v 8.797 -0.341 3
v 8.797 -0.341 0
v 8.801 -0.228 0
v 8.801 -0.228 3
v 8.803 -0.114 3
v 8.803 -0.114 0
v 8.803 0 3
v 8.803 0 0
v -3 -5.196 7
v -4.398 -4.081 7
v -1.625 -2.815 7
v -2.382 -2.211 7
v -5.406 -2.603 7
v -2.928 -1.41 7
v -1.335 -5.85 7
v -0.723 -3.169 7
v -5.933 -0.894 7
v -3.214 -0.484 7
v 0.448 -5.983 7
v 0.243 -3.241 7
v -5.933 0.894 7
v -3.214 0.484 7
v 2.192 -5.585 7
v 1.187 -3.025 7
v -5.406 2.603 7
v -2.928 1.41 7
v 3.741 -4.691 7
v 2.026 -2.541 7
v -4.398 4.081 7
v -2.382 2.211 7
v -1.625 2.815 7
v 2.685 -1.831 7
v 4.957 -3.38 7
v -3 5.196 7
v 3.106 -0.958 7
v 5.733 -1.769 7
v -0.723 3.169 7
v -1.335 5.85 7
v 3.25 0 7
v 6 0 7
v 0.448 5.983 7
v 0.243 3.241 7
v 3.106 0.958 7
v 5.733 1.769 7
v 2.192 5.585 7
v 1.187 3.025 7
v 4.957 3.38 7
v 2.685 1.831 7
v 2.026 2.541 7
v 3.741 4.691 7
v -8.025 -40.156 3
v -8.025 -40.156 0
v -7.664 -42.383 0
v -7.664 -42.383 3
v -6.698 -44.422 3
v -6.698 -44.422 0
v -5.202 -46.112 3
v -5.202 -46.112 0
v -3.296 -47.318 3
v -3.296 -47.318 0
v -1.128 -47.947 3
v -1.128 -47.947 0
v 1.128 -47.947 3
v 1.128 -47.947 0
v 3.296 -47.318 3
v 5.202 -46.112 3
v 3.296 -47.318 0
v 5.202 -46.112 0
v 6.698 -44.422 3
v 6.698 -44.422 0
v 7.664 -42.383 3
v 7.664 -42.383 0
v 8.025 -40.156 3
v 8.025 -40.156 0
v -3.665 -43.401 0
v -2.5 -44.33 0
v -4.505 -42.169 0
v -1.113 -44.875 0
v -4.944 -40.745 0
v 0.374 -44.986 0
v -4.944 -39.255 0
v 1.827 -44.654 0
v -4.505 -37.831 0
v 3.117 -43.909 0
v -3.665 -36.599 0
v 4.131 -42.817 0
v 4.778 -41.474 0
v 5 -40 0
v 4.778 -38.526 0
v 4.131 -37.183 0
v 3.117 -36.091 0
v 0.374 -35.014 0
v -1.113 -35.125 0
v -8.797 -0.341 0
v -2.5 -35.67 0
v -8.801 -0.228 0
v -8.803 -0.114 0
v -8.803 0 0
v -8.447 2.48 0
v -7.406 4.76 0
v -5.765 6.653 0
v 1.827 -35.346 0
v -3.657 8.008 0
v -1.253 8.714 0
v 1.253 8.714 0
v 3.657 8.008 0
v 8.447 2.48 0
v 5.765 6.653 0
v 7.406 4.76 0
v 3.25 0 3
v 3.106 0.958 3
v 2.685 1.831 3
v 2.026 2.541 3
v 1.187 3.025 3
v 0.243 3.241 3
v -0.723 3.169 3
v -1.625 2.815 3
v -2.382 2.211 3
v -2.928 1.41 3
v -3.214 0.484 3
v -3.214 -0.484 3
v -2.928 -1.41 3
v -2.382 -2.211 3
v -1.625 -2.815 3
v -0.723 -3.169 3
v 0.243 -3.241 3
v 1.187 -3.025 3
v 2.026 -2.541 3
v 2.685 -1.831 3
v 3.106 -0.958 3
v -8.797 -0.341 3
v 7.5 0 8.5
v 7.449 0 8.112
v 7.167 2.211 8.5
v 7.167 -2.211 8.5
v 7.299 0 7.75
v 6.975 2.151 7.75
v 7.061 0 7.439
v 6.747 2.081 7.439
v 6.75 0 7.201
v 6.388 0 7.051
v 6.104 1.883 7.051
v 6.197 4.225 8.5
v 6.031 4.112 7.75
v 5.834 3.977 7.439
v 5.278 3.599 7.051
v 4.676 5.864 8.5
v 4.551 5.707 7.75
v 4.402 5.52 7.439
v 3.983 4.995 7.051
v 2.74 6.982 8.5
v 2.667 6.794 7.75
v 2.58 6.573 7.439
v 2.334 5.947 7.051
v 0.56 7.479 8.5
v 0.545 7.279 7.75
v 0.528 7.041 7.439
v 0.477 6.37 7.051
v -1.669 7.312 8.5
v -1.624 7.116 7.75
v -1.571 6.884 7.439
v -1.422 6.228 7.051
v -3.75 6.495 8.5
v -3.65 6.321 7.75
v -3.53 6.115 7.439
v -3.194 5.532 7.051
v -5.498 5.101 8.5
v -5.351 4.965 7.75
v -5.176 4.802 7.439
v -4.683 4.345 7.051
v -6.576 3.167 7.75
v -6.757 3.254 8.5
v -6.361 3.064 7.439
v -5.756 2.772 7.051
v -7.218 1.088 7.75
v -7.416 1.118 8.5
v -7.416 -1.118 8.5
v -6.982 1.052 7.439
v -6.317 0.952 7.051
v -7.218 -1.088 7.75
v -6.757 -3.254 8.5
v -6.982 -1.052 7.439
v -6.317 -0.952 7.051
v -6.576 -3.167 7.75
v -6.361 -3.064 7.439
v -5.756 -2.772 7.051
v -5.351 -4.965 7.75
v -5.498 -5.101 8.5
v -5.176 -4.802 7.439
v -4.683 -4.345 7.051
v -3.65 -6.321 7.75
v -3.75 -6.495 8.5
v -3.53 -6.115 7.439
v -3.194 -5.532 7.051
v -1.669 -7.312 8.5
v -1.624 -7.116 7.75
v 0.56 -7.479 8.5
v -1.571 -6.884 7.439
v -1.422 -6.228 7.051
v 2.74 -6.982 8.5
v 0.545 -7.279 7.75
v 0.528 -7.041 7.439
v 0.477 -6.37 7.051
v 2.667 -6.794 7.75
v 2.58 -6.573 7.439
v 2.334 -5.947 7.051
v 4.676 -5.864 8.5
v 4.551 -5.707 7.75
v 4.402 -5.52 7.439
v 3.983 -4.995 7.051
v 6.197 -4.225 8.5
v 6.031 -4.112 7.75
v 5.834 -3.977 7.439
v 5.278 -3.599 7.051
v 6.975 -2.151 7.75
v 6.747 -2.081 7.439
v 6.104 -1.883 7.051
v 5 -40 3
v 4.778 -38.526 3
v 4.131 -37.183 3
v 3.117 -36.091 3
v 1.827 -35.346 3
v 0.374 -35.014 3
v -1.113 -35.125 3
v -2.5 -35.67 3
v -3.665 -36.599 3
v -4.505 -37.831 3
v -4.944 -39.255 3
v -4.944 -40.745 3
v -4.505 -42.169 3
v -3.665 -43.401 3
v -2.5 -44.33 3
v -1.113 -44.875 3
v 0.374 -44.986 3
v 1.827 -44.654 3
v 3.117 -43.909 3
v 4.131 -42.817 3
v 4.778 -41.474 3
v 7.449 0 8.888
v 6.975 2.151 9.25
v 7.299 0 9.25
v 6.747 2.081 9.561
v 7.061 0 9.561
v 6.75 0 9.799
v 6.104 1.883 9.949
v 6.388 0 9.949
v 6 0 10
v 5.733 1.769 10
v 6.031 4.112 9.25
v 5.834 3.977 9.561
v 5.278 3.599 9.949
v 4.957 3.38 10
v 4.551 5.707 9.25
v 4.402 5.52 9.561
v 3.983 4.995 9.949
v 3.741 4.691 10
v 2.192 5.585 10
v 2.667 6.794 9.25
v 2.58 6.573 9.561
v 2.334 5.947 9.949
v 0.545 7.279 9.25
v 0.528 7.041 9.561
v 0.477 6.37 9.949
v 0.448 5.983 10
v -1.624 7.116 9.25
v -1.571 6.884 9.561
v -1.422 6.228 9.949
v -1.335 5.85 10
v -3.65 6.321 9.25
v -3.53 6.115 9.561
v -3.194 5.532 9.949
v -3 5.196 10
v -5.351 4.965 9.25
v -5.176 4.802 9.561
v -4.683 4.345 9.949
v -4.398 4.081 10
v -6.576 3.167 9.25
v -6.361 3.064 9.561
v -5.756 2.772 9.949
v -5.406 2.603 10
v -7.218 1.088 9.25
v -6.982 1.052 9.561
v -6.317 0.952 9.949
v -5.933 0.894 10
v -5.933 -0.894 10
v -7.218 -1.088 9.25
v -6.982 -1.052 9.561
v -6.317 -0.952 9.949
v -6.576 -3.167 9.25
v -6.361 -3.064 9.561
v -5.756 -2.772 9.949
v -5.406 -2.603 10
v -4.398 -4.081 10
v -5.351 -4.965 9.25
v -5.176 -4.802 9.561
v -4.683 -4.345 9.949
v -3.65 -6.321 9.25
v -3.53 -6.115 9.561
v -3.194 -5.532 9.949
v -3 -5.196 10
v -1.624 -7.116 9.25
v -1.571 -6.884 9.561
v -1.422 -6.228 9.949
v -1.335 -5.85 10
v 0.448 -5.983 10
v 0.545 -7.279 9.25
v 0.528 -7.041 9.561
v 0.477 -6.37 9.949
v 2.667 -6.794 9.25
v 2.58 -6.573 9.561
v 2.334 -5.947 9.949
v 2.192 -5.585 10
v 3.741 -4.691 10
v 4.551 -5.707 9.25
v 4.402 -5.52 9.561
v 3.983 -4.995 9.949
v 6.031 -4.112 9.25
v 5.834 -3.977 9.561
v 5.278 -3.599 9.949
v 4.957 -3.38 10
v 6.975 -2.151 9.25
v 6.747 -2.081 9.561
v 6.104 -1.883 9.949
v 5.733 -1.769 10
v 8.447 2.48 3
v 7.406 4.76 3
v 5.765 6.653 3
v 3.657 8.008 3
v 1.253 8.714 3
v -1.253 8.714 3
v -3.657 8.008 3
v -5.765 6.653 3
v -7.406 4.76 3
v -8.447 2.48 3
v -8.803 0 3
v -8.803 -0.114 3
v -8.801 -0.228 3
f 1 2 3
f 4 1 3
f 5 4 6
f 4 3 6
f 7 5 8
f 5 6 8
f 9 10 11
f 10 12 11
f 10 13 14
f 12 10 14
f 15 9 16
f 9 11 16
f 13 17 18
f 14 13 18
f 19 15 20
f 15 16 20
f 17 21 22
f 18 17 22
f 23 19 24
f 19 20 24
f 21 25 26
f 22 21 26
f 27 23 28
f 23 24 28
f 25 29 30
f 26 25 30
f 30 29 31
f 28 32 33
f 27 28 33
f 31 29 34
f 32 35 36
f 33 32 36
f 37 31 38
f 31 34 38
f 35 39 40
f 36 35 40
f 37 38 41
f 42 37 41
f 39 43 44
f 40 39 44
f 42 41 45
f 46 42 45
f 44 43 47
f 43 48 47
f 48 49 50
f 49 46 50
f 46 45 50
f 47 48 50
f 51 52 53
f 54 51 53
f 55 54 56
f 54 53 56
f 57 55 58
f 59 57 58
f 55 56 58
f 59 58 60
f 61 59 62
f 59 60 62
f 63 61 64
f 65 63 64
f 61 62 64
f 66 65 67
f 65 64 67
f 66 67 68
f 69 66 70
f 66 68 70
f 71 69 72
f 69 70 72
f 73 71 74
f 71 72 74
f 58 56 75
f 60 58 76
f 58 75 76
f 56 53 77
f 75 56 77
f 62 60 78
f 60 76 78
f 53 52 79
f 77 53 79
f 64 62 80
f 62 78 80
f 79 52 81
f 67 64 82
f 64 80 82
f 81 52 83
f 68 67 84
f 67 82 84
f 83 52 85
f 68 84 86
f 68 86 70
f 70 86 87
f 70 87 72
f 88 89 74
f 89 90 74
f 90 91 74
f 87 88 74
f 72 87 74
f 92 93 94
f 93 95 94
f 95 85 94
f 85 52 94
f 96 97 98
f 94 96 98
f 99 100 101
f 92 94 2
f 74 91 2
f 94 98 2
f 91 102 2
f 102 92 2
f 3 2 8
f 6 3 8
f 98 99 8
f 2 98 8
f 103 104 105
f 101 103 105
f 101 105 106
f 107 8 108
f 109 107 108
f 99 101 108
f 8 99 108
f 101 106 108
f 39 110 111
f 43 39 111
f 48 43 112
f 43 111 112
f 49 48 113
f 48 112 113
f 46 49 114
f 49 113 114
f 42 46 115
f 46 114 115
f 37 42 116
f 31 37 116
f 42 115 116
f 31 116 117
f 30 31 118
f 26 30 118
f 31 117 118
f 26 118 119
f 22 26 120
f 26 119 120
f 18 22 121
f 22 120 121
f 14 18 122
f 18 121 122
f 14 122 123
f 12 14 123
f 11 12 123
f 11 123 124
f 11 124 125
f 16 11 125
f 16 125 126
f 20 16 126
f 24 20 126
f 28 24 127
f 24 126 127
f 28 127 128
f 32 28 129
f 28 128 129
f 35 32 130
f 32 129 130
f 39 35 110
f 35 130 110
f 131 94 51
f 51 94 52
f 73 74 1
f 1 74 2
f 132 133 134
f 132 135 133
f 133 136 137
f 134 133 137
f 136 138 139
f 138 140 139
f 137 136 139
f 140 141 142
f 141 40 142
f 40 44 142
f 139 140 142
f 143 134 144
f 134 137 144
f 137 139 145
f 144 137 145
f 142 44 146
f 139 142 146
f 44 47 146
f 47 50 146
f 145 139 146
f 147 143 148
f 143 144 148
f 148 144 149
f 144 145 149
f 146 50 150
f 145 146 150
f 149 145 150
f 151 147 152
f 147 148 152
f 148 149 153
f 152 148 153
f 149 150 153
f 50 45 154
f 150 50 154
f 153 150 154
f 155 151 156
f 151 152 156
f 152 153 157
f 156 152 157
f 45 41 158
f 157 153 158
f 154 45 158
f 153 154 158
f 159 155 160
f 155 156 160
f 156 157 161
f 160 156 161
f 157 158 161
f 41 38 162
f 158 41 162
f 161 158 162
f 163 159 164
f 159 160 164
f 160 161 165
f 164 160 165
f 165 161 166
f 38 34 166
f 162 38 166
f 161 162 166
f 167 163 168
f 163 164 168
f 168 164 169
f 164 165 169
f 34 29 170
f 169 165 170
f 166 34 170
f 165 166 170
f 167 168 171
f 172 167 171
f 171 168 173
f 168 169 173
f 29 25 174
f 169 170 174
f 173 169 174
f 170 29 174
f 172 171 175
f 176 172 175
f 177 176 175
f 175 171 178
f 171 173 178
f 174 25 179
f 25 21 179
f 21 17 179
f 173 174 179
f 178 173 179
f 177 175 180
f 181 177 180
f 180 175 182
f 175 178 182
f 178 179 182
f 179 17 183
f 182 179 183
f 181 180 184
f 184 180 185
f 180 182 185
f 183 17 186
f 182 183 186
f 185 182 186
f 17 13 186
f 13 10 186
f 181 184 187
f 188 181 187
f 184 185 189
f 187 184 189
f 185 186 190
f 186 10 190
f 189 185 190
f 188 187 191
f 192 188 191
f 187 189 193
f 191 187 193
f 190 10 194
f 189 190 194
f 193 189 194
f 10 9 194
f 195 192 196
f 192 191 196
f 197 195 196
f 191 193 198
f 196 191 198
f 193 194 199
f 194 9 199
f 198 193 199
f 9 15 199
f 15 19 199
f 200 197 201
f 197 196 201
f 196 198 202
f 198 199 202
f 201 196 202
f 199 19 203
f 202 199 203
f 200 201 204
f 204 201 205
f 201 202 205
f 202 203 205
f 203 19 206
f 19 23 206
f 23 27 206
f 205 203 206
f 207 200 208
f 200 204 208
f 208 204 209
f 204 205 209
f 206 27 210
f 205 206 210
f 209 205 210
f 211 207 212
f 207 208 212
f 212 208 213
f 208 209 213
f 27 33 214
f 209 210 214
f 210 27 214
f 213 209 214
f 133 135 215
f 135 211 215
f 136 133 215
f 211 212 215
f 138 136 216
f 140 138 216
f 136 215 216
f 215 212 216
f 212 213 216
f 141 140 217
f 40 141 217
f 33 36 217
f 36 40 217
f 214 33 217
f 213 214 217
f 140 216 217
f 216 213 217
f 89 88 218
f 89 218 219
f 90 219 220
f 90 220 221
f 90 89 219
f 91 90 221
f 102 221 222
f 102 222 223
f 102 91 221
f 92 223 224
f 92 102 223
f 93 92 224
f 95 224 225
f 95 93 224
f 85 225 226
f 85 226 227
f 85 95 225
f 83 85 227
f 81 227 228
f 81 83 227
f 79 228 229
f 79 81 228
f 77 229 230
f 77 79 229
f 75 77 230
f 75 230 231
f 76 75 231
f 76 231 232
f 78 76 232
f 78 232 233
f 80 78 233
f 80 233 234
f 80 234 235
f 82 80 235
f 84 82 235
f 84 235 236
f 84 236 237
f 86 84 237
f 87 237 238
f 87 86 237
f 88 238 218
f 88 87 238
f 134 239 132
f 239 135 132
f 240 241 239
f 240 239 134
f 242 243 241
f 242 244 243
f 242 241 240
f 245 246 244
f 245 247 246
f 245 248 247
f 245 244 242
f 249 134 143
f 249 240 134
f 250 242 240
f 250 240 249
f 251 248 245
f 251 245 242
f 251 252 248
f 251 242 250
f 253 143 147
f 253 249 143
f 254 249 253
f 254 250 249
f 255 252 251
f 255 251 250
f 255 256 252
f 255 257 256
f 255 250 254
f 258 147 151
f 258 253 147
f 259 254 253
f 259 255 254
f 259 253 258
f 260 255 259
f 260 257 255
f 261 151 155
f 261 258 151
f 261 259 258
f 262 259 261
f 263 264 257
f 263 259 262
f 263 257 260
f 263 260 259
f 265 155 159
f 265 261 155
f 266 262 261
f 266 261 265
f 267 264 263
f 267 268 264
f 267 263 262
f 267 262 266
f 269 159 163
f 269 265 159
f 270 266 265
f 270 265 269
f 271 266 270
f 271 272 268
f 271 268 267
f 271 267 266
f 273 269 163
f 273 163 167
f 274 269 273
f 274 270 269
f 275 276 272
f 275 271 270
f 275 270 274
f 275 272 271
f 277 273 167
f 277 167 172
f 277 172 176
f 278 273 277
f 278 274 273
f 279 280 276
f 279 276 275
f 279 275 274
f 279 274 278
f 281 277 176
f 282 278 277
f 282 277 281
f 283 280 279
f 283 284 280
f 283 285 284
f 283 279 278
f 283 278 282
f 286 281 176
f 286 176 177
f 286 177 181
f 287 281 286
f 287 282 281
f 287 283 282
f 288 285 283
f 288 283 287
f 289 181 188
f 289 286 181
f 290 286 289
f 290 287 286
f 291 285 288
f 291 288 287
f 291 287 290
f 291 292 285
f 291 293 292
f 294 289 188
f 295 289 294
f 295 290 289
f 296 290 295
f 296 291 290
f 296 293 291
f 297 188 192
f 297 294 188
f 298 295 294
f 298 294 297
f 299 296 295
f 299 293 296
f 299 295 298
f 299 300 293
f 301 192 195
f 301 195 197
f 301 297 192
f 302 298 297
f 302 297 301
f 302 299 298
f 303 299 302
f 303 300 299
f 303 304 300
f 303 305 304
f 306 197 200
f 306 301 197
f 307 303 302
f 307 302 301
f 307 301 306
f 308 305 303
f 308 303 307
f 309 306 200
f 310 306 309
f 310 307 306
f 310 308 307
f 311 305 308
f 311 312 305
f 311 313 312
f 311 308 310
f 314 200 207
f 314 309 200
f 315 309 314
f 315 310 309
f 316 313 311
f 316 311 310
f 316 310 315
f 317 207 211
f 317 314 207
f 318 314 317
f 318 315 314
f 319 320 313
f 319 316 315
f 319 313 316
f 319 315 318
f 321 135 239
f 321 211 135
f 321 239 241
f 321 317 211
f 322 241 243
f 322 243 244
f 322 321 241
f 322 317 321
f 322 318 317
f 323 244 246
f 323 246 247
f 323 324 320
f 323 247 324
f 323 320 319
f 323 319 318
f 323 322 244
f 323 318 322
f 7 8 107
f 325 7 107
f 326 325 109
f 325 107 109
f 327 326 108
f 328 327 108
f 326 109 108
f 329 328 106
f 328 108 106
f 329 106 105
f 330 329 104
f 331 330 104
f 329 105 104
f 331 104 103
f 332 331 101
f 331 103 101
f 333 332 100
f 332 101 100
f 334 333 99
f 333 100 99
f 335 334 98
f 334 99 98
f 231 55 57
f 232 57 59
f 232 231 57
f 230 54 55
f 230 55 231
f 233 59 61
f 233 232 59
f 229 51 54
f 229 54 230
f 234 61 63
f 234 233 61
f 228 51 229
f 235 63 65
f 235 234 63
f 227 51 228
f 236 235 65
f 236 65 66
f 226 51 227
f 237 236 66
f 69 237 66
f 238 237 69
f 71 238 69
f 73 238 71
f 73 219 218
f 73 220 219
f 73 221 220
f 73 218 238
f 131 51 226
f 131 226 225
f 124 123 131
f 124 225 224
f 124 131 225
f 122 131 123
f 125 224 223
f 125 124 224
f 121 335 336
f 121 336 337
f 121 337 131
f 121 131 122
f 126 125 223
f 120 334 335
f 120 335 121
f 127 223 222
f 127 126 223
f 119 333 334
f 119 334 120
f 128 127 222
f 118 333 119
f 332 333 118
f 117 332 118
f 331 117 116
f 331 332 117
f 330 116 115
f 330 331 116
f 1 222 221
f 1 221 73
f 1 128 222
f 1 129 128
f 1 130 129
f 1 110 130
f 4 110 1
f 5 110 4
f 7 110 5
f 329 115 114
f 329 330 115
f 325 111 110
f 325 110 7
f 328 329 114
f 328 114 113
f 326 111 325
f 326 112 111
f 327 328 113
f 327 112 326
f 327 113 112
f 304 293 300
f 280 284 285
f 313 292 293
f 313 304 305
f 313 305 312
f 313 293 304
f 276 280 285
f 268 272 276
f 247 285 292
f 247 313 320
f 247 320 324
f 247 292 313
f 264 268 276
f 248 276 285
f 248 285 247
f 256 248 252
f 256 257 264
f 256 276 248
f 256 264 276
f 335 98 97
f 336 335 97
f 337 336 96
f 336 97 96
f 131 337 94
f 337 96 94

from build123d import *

# Parameters (mm, degrees)
F0_R     = 5
F1_DEPTH = 3
F2_R     = 3.25
F3_DEPTH = 4
F4_R     = 7.5
F5_DEPTH = 3
F6_R     = 1.49999


# Not quite as in the source:
# - a fillet or chamfer is up to 0.001 mm smaller than in the source, because OpenCascade refuses the exact size


with BuildPart() as f1:
    # F0 (on Top) → F1 (new body)
    with BuildSketch(Plane.XY):
        with BuildLine():
            Line((8.8034559258, 0), (8.7968361379, -0.3413359058))
            ThreePointArc((8.7968361379, -0.3413359058), (8.8018008233, -0.1707000455), (8.8034559258, 0))
        make_face()
        with BuildLine():
            Line((8.024687147, -40.1556288865), (8.7968361379, -0.3413359058))
            Line((8.7968361379, -0.3413359058), (8.8034559258, 0))
            ThreePointArc((8.8034559258, 0), (0, 8.8034559258), (-8.8034559258, 0))
            Line((-8.8034559258, 0), (-8.7968361379, -0.3413359058))
            Line((-8.7968361379, -0.3413359058), (-8.024687147, -40.1556288865))
            ThreePointArc((-8.024687147, -40.1556288865), (0, -48.02619612), (8.024687147, -40.1556288865))
        make_face()
        with Locations((0, -40)):
            Circle(F0_R, mode=Mode.SUBTRACT)
        with BuildLine():
            Line((-8.7968361379, -0.3413359058), (-8.8034559258, 0))
            ThreePointArc((-8.8034559258, 0), (-8.8018008233, -0.1707000455), (-8.7968361379, -0.3413359058))
        make_face()
    extrude(amount=F1_DEPTH)

    # F2 (on face) → F3 (join)
    with BuildSketch(Plane.XY.offset(3)):
        Circle(F2_R)
    extrude(amount=F3_DEPTH)

    # F4 (on face) → F5 (join)
    with BuildSketch(Plane.XY.offset(7)):
        Circle(F4_R)
    extrude(amount=F5_DEPTH)

    # F6 (radius 1.5 in the source; OpenCascade refuses exactly that, so slightly less here)
    f6_edges = [f1.edges().sort_by_distance(p)[0] for p in [
        (-7.5, 0, 10),
        (-7.5, 0, 7),
    ]]
    fillet(f6_edges, radius=F6_R)


solid = f1.part
